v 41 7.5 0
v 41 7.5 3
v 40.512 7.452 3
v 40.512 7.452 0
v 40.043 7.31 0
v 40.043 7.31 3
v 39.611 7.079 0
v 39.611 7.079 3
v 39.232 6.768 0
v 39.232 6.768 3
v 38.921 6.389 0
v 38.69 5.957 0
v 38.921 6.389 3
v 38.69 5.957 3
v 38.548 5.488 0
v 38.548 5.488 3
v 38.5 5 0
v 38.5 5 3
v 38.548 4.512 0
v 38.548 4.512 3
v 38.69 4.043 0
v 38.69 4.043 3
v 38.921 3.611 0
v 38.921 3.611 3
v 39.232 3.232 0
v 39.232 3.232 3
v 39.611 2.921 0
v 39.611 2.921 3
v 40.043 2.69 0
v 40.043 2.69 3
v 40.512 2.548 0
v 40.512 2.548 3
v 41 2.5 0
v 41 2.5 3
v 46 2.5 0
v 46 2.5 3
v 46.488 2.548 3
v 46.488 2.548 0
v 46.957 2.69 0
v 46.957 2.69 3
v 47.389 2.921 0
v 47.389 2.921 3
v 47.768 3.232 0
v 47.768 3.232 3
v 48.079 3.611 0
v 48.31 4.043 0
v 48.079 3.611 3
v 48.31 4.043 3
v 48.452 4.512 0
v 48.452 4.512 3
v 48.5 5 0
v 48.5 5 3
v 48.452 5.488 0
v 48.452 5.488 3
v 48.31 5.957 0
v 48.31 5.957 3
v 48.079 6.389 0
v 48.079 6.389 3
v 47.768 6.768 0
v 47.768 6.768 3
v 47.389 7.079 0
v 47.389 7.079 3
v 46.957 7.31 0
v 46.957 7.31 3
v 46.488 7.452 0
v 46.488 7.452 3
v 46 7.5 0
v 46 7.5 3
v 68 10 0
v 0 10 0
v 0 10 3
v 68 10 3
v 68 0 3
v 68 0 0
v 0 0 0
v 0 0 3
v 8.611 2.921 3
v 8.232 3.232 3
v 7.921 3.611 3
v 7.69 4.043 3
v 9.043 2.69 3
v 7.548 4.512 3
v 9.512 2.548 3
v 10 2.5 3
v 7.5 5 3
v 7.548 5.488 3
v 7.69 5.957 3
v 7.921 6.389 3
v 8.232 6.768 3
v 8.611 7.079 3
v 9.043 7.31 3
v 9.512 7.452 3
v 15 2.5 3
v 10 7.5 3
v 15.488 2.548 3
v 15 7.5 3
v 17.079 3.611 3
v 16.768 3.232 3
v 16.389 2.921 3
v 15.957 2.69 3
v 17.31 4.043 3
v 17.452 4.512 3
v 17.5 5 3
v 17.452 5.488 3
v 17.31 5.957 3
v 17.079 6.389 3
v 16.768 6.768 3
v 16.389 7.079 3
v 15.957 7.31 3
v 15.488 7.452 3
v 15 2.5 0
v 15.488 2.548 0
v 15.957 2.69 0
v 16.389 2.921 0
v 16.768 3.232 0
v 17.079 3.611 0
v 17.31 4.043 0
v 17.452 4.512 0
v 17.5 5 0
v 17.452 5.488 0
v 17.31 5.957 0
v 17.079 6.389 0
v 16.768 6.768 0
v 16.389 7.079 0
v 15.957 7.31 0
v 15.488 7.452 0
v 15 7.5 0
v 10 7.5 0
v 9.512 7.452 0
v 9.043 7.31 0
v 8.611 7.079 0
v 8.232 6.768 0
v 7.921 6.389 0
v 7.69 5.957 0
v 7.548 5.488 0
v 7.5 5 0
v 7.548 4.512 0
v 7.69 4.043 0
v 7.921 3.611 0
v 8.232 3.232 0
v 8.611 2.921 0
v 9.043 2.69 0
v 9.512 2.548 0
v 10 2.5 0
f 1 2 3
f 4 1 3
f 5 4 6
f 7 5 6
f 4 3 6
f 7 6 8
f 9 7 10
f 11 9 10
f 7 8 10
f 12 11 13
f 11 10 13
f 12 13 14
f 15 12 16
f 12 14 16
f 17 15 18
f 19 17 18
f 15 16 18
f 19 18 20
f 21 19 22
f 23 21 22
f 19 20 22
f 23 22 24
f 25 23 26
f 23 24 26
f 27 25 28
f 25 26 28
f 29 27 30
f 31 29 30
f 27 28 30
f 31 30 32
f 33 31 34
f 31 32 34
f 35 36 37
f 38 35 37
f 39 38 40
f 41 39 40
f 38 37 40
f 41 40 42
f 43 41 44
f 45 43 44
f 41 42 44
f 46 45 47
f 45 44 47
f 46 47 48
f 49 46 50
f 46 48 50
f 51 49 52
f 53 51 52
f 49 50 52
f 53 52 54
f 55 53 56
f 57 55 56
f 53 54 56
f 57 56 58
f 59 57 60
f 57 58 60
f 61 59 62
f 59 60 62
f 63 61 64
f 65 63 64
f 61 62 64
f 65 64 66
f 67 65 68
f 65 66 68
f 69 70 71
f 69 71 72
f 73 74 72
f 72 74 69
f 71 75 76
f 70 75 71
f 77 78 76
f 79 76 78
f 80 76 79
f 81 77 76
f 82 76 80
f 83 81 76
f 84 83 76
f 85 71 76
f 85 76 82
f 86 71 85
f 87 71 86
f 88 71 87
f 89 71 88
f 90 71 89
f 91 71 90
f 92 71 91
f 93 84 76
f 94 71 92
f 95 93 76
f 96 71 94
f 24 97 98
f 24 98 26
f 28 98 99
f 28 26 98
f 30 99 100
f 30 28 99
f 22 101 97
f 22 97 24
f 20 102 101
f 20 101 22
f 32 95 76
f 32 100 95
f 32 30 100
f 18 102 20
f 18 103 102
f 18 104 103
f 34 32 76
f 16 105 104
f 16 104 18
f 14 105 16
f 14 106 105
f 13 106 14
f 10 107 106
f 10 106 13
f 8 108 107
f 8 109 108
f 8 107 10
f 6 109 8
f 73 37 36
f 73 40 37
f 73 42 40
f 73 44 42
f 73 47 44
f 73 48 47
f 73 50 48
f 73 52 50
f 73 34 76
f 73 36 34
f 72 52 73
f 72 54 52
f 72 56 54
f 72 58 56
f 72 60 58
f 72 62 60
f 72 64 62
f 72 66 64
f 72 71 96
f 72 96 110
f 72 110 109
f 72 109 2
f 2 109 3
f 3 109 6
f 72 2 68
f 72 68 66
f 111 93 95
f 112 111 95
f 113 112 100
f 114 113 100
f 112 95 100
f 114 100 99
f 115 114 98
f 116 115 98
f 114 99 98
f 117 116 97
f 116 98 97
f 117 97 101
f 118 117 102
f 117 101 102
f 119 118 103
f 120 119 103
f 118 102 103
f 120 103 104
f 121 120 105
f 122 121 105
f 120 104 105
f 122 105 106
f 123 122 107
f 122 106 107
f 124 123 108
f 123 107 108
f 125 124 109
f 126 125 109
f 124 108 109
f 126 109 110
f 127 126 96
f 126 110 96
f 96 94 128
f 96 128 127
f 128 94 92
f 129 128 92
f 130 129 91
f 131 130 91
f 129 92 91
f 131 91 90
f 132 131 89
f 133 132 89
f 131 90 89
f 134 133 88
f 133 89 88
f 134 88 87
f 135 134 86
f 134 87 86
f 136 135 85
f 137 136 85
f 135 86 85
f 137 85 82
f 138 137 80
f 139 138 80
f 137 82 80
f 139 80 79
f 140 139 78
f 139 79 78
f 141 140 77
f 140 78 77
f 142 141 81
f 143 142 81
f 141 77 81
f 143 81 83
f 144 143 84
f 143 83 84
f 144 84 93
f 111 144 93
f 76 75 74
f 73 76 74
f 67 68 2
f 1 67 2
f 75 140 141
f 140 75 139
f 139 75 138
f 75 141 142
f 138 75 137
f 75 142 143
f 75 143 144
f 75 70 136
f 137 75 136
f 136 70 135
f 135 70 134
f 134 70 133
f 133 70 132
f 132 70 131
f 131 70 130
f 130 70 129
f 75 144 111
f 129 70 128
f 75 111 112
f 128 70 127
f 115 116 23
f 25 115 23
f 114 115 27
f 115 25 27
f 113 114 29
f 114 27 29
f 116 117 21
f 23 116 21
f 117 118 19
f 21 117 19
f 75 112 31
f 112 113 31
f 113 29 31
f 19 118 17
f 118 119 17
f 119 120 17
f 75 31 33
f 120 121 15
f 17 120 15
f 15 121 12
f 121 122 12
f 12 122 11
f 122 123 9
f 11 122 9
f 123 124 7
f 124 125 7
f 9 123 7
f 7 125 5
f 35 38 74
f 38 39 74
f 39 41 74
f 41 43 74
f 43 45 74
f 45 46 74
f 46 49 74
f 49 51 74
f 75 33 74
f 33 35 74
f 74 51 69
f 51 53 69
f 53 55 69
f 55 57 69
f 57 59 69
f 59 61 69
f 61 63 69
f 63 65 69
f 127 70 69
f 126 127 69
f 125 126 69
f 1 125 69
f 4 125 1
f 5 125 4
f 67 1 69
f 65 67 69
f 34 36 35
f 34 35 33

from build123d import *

# Parameters (mm, degrees)
SKETCH_W        = 68
SKETCH_H        = 10
PAD_DEPTH       = 3
POCKET001_DEPTH = 3.001


with BuildPart() as part:
    # Sketch → Pad (new body)
    with BuildSketch(Plane.XY):
        with Locations((34, 5)):
            Rectangle(SKETCH_W, SKETCH_H)
    extrude(amount=PAD_DEPTH)

    # Sketch002 → Pocket001 (cut, through all)
    with BuildSketch(Plane.XY.offset(3)):
        with BuildLine():
            ThreePointArc((10, 7.5), (7.5, 5), (10, 2.5))
            Line((10, 2.5), (15, 2.5))
            ThreePointArc((15, 2.5), (17.5, 5), (15, 7.5))
            Line((10, 7.5), (15, 7.5))
        make_face()
        with BuildLine():
            ThreePointArc((46, 2.5), (48.5, 5), (46, 7.5))
            Line((46, 7.5), (41, 7.5))
            ThreePointArc((41, 7.5), (38.5, 5), (41, 2.5))
            Line((46, 2.5), (41, 2.5))
        make_face()
    extrude(amount=-POCKET001_DEPTH, mode=Mode.SUBTRACT)


solid = part.part
